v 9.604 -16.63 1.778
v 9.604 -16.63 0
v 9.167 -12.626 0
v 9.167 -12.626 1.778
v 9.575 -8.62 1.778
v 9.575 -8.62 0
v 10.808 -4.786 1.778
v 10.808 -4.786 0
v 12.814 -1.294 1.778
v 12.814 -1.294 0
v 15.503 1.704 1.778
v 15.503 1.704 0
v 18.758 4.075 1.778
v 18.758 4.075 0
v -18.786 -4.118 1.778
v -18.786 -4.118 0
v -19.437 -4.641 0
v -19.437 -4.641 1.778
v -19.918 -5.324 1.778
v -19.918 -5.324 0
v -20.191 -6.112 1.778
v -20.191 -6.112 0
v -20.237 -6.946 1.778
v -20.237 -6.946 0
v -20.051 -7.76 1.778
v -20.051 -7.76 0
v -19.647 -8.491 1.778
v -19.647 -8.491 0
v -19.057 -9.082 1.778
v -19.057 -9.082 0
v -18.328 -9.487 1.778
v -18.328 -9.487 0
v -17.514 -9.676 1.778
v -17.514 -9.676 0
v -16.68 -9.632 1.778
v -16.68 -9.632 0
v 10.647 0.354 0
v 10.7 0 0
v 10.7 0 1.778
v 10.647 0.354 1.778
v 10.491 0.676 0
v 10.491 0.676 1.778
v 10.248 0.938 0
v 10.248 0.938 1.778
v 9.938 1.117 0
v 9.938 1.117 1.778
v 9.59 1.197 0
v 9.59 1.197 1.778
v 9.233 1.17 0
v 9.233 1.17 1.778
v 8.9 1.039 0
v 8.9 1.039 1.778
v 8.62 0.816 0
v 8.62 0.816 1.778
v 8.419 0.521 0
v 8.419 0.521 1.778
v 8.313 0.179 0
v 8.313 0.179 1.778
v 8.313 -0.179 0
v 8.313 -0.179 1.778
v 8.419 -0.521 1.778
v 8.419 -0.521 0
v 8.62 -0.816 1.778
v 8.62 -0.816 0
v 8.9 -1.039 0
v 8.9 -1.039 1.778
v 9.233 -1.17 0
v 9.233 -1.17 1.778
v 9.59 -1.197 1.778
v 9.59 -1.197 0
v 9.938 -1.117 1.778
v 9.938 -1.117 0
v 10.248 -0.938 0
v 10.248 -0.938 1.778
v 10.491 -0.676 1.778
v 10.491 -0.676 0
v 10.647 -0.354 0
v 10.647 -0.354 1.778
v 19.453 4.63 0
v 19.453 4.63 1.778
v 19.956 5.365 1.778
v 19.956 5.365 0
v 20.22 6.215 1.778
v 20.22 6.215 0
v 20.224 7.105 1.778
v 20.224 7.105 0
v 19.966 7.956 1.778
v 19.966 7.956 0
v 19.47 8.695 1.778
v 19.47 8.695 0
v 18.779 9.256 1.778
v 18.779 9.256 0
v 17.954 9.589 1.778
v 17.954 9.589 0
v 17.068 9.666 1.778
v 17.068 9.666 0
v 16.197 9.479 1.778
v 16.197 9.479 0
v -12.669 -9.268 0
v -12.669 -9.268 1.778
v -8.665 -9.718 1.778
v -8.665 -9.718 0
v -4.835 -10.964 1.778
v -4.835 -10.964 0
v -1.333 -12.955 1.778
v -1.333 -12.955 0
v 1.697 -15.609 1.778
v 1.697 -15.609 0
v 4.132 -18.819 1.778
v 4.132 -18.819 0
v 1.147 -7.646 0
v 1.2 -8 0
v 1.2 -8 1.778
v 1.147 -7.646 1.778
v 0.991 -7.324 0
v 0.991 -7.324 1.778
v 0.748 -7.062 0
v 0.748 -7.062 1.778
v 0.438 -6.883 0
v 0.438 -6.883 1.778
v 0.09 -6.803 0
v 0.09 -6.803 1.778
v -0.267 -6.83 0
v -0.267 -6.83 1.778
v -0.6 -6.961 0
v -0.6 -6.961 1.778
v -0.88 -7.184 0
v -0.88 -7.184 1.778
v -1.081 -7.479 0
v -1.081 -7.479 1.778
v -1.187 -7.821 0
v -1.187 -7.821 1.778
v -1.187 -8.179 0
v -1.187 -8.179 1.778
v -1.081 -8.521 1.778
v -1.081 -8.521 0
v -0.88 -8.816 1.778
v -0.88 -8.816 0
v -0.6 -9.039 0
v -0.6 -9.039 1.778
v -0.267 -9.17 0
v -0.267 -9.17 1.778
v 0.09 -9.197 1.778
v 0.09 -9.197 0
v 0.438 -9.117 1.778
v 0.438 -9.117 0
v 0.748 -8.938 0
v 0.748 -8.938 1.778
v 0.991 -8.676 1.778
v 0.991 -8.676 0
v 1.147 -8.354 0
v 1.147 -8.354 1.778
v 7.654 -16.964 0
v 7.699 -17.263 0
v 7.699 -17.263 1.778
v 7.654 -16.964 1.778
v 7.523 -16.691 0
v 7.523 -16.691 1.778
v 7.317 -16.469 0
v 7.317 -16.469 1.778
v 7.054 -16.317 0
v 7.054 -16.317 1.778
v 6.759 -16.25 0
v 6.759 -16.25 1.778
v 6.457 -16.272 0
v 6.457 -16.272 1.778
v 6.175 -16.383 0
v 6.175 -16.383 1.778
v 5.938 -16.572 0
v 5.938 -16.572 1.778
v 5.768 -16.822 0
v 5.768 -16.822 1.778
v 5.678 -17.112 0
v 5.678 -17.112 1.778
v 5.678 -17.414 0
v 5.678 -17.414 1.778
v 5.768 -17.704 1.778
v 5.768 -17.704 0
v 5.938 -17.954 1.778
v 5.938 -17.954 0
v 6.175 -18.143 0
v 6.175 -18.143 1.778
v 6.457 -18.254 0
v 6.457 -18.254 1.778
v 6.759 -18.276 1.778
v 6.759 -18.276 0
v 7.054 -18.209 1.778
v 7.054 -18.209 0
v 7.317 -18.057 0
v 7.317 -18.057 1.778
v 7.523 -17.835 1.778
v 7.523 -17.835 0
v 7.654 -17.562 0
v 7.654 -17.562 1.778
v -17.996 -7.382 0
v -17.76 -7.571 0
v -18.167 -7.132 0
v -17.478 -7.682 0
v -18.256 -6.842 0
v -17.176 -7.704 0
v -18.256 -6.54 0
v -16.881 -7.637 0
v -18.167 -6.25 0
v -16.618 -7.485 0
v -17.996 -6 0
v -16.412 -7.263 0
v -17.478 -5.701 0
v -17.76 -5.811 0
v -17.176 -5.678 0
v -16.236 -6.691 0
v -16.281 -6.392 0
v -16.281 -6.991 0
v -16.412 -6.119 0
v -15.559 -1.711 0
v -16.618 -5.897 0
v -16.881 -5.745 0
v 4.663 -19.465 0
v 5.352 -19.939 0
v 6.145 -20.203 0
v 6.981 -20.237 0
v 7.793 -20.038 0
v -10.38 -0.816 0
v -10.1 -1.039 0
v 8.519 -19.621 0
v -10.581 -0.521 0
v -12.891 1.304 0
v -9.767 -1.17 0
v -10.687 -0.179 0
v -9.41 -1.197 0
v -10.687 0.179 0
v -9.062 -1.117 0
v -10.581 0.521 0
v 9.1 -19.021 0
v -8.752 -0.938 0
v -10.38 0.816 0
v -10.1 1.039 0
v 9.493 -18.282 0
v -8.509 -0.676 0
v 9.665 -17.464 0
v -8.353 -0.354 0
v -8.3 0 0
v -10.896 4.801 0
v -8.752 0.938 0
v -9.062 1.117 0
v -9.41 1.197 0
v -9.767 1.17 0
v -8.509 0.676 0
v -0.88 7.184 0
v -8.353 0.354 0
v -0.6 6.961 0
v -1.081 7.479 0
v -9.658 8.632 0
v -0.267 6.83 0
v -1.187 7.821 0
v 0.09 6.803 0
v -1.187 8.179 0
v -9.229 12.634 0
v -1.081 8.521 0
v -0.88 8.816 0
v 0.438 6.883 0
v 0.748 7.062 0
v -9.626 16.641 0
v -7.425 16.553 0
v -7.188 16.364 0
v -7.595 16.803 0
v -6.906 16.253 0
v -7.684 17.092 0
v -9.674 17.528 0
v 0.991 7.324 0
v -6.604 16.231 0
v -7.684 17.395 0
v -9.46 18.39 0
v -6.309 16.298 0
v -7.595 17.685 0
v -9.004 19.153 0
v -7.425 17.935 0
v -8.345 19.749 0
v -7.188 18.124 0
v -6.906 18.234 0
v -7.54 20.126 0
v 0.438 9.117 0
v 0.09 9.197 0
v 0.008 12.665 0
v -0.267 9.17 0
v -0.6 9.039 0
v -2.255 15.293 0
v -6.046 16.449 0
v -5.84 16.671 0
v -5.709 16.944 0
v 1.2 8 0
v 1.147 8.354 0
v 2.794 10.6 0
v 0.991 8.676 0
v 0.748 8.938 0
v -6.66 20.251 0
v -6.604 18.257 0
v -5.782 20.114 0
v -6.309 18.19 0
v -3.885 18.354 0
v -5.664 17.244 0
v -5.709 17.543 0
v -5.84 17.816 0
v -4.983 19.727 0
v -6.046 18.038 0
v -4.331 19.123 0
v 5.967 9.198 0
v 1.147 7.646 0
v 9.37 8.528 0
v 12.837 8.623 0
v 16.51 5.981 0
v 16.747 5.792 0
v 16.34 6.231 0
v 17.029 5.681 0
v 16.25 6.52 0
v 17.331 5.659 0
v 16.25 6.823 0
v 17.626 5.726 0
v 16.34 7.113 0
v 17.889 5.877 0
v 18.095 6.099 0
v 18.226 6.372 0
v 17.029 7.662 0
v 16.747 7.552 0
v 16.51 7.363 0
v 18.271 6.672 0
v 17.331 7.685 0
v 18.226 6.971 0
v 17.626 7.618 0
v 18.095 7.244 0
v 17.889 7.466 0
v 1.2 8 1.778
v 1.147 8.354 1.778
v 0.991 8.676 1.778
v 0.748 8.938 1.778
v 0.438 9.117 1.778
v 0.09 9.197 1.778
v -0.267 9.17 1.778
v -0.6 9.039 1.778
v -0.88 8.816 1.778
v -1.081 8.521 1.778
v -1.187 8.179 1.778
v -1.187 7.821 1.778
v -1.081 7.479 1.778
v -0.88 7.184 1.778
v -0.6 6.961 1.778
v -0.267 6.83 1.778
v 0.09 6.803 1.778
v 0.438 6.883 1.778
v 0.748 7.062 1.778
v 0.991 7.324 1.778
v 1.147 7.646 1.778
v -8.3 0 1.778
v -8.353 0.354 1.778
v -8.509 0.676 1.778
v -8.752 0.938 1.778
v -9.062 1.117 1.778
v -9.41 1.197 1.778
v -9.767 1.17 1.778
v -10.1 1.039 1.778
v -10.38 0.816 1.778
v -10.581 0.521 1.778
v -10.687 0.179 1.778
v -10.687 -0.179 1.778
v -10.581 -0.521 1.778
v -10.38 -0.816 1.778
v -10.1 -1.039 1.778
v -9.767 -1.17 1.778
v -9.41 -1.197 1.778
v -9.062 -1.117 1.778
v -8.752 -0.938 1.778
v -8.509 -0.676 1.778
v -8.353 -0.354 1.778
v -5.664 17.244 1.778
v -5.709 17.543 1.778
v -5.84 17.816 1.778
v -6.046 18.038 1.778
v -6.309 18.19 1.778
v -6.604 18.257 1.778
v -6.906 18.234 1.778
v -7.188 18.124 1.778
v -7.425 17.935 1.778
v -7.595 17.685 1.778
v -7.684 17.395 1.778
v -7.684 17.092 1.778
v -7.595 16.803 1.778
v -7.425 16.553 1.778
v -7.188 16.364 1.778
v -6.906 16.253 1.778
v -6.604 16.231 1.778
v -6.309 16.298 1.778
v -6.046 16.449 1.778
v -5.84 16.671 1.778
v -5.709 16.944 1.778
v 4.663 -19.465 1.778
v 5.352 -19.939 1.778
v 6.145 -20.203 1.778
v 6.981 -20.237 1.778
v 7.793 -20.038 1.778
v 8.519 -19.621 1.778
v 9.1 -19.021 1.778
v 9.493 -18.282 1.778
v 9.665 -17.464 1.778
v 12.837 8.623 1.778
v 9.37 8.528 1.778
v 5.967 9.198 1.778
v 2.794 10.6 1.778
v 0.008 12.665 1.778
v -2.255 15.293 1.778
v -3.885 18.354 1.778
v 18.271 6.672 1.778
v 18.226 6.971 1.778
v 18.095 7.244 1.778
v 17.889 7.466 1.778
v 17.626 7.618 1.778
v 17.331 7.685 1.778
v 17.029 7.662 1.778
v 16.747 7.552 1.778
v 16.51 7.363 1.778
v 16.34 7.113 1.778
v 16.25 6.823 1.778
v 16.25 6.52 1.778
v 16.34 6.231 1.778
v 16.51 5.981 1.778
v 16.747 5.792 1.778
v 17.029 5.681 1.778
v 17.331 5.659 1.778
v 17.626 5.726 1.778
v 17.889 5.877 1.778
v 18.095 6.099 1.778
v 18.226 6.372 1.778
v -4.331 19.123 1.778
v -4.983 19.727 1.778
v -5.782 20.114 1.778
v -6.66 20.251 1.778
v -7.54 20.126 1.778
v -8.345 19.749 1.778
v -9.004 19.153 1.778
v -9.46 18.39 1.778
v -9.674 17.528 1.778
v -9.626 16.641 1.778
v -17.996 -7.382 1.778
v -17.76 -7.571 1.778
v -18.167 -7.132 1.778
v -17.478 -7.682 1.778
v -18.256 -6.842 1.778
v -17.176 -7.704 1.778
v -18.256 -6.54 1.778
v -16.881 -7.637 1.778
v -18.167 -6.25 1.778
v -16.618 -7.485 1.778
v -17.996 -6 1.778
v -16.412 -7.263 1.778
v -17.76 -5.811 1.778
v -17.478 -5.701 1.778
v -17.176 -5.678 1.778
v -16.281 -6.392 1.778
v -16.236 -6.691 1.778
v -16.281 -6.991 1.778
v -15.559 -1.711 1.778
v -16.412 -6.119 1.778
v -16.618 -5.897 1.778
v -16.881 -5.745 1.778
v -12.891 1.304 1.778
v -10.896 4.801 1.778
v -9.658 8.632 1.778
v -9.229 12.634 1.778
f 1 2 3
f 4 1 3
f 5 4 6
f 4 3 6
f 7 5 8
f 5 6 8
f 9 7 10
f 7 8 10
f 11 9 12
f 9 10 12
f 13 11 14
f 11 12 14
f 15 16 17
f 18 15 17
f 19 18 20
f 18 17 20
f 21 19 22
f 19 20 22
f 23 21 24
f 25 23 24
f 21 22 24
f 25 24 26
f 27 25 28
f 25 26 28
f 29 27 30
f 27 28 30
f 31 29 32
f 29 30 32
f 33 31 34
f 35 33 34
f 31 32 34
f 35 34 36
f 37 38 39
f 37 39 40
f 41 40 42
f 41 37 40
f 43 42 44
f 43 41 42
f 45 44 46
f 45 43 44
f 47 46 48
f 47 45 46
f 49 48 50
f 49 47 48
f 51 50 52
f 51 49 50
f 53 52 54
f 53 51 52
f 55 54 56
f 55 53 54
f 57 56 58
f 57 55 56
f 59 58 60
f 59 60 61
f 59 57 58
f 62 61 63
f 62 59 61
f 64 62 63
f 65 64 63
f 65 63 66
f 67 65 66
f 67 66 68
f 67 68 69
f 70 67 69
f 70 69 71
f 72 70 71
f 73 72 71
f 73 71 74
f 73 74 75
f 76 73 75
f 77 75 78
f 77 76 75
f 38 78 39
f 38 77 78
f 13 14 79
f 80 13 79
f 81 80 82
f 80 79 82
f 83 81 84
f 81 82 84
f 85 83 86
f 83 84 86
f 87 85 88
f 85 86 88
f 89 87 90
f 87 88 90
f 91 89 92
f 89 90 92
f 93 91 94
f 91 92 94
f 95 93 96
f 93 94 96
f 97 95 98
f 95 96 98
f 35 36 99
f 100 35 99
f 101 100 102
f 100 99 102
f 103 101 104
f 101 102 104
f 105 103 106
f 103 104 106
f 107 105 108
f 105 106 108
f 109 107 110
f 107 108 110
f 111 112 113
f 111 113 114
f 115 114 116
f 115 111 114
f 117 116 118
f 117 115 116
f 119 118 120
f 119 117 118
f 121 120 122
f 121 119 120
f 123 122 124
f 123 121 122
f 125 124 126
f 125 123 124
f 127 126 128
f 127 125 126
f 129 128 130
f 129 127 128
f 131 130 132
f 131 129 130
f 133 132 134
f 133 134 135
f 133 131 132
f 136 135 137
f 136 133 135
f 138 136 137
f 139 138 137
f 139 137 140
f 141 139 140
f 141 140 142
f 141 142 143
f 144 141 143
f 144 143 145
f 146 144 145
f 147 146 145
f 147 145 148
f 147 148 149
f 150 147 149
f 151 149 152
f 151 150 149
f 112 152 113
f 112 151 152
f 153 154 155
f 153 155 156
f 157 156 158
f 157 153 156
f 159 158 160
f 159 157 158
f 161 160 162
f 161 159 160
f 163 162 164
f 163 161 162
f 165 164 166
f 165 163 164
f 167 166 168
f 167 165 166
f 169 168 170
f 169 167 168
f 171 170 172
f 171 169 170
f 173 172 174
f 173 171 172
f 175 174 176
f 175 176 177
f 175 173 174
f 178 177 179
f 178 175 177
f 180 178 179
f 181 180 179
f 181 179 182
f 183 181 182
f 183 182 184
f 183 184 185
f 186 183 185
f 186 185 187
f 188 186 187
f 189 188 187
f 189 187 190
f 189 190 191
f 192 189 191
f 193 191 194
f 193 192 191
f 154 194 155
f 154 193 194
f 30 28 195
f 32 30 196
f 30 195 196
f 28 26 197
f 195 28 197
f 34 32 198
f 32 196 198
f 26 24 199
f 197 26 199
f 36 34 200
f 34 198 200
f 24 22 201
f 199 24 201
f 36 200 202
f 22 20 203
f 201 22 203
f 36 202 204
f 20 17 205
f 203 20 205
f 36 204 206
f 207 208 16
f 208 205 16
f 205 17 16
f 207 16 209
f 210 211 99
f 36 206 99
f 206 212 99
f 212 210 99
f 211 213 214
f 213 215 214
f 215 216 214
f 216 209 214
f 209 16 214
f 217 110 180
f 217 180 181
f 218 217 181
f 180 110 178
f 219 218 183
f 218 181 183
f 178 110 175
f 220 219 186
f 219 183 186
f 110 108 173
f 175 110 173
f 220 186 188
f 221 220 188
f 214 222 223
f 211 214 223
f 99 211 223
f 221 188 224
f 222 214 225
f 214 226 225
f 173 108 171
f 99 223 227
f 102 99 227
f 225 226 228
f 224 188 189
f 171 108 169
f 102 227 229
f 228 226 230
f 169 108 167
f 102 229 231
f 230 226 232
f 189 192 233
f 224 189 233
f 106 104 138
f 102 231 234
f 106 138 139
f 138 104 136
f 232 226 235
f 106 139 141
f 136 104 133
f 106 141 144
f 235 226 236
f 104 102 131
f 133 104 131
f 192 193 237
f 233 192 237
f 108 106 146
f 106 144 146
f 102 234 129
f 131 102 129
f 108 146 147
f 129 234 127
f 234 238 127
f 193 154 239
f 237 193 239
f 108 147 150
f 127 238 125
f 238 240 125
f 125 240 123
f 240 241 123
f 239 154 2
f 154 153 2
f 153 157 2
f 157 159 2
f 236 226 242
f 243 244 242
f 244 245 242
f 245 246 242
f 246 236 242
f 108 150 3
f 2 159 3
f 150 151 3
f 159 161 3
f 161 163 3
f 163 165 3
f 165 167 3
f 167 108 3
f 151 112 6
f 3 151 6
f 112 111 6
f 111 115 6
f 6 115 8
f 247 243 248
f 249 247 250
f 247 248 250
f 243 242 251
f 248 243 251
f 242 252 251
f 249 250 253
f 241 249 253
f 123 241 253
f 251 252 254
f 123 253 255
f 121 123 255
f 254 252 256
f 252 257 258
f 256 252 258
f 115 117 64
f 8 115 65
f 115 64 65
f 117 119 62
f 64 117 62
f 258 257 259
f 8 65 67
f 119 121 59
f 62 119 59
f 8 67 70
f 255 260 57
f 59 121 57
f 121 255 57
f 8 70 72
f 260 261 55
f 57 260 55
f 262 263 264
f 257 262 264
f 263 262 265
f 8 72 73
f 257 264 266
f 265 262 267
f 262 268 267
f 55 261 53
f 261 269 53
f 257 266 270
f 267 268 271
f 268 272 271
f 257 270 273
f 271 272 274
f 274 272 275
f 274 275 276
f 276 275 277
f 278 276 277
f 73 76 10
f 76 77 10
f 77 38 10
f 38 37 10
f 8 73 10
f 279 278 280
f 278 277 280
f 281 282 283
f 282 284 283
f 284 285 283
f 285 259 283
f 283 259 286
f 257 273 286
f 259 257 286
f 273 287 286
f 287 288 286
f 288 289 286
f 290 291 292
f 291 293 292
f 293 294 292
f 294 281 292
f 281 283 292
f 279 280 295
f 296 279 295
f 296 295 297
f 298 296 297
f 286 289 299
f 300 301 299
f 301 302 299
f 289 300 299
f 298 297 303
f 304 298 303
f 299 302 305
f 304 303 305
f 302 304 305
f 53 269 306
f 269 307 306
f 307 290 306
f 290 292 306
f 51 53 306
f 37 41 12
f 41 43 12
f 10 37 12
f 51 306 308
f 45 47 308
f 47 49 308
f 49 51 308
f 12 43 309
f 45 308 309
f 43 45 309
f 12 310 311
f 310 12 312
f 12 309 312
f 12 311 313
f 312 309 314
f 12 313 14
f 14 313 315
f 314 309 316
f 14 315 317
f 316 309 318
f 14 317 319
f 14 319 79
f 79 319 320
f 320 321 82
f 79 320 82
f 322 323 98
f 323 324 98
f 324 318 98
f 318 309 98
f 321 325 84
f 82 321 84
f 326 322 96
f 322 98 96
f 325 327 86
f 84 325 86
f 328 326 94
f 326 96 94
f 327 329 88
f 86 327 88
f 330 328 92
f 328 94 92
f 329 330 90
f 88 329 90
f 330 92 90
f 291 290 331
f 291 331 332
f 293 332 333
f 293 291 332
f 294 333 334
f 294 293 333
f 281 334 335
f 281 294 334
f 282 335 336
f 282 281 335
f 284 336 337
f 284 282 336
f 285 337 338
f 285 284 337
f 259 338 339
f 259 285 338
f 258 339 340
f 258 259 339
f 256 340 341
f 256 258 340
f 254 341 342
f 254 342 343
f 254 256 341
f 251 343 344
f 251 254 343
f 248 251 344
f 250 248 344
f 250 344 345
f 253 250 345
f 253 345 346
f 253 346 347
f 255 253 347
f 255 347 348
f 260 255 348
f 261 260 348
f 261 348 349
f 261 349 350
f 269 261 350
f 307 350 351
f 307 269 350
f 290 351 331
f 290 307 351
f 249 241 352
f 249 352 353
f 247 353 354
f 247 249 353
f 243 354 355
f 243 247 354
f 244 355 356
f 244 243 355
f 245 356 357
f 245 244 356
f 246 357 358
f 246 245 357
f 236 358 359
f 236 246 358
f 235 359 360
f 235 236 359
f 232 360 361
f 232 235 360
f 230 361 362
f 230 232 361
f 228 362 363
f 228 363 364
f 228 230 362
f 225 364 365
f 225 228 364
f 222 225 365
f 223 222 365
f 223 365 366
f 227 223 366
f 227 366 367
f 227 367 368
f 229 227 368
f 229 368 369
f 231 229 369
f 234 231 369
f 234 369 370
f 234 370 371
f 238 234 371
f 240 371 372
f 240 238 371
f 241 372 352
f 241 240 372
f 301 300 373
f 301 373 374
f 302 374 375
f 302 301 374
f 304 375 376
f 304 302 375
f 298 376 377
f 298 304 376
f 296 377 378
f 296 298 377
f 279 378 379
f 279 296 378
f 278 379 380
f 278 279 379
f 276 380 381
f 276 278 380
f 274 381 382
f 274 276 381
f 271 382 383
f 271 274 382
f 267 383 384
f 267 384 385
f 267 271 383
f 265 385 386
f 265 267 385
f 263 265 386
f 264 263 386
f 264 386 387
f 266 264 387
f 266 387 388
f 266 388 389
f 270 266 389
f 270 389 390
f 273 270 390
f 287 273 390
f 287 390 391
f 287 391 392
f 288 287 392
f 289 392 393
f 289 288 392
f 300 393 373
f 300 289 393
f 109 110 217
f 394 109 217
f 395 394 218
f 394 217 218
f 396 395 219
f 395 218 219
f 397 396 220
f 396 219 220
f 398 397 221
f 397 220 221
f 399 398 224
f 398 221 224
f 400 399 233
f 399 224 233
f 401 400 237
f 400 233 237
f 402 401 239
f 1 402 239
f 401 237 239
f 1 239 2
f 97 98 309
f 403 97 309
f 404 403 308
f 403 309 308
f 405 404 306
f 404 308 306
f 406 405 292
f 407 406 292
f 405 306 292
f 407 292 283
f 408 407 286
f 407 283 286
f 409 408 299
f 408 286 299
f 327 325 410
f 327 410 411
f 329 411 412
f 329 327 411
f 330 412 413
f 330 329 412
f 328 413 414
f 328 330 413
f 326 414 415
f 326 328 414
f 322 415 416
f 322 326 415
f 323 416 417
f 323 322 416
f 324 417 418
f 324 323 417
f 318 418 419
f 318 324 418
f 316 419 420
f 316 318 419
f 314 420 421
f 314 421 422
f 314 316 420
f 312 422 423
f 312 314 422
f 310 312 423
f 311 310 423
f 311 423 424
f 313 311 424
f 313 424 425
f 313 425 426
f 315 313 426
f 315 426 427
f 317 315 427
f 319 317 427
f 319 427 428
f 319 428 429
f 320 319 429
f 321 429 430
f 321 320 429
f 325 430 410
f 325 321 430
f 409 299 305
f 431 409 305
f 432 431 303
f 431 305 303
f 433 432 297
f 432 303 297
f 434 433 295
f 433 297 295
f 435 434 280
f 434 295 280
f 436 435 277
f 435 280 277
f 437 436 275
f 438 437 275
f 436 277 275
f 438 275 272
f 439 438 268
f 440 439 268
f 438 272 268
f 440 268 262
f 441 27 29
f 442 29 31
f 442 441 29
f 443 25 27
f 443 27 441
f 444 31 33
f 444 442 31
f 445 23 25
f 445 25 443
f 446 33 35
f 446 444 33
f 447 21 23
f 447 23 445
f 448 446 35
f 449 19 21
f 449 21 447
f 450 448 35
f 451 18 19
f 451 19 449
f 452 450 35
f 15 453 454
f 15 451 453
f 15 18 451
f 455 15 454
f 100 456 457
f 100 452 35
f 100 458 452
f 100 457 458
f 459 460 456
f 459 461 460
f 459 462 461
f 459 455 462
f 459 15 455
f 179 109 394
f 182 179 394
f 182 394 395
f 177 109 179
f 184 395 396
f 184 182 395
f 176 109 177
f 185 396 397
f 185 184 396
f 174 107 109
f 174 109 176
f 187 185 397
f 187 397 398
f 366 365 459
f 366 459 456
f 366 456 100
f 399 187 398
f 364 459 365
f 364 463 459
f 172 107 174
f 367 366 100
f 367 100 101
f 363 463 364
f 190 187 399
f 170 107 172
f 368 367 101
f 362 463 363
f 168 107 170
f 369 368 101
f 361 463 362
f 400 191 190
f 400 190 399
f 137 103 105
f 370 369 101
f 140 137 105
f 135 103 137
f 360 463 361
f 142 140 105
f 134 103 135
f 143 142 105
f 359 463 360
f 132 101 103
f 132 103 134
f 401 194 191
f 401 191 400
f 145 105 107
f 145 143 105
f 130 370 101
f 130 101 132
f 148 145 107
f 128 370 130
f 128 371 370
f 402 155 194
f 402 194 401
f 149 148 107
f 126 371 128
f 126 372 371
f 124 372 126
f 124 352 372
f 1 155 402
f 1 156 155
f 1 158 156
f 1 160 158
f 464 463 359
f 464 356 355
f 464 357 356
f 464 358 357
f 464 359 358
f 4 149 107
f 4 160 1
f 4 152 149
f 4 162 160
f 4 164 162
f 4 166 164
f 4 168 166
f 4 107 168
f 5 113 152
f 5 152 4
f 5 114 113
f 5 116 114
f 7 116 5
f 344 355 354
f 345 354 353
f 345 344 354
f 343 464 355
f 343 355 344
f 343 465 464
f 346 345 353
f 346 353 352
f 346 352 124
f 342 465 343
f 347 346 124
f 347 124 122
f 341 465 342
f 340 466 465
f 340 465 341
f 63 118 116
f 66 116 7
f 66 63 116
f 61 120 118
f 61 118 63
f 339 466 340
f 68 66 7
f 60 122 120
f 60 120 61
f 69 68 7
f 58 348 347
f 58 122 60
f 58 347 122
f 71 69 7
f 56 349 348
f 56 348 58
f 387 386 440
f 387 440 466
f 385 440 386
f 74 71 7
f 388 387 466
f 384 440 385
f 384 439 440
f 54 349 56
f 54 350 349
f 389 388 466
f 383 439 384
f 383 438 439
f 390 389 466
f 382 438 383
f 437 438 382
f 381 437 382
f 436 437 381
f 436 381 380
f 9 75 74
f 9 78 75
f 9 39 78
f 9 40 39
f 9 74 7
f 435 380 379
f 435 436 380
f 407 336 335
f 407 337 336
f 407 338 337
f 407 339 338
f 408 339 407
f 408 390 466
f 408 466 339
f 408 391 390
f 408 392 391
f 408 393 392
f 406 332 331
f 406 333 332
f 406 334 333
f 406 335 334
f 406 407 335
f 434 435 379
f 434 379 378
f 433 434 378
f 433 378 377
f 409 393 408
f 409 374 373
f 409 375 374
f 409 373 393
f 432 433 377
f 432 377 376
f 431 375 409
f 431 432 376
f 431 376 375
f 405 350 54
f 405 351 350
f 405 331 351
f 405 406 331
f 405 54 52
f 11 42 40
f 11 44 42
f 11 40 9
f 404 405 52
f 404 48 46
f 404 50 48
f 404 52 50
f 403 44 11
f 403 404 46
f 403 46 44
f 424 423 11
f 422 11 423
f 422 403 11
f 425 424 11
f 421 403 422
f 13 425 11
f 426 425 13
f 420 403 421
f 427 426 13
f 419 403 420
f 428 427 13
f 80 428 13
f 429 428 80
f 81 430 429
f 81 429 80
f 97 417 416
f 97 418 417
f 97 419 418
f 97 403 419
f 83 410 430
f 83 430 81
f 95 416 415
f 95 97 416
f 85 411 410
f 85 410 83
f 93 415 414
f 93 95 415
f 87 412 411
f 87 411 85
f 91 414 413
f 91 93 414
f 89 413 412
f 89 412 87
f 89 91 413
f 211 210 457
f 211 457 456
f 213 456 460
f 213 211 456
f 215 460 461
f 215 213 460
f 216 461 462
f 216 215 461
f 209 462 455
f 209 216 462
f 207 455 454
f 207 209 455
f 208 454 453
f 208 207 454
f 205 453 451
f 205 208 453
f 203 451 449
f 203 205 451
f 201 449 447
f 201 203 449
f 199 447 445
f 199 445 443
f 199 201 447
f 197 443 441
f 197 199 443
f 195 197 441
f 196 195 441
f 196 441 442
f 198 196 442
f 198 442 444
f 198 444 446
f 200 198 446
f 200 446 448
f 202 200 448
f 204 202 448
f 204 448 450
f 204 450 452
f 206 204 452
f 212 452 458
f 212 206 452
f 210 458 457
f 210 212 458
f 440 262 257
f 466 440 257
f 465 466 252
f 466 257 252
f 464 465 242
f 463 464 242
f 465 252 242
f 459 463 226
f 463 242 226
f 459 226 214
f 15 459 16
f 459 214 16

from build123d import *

# Parameters (mm, degrees)
SKETCH1_R           = 1.2
SKETCH1_R_2         = 1.016
BOSS_EXTRUDE1_DEPTH = 1.778


with BuildPart() as part:
    # Sketch1 → Boss-Extrude1 (new body)
    with BuildSketch(Plane.XY):
        with BuildLine():
            ThreePointArc((-18.786436302, -4.117817235), (-20.050708925, -7.759998805), (-16.680479475, -9.632276912))
            ThreePointArc((-16.680479475, -9.632276912), (-4.834628254, -10.963744593), (4.131590393, -18.818928901))
            ThreePointArc((4.131590393, -18.818928901), (7.793176957, -20.037700838), (9.603735314, -16.629695609))
            ThreePointArc((9.603735314, -16.629695609), (10.808475978, -4.78617574), (18.757897672, 4.075373655))
            ThreePointArc((18.757897672, 4.075373655), (19.966132816, 7.95635676), (16.197476331, 9.479212735))
            ThreePointArc((16.197476331, 9.479212735), (4.341589411, 9.810476534), (-3.884701894, 18.354475699))
            ThreePointArc((-3.884701894, 18.354475699), (-7.540001964, 20.125778306), (-9.626354431, 16.640686499))
            ThreePointArc((-9.626354431, 16.640686499), (-10.896236616, 4.800764559), (-18.786436302, -4.117817235))
        make_face()
        with Locations((0, 8)):
            Circle(SKETCH1_R, mode=Mode.SUBTRACT)
        with Locations((-9.5, 0)):
            Circle(SKETCH1_R, mode=Mode.SUBTRACT)
        with Locations((9.5, 0)):
            Circle(SKETCH1_R, mode=Mode.SUBTRACT)
        with Locations((0, -8)):
            Circle(SKETCH1_R, mode=Mode.SUBTRACT)
        with Locations((17.255056752, 6.671807588)):
            Circle(SKETCH1_R_2, mode=Mode.SUBTRACT)
        with Locations((6.683111778, -17.263013667)):
            Circle(SKETCH1_R_2, mode=Mode.SUBTRACT)
        with Locations((-17.251709477, -6.691068694)):
            Circle(SKETCH1_R_2, mode=Mode.SUBTRACT)
        with Locations((-6.679764504, 17.243752562)):
            Circle(SKETCH1_R_2, mode=Mode.SUBTRACT)
    extrude(amount=BOSS_EXTRUDE1_DEPTH)


solid = part.part
